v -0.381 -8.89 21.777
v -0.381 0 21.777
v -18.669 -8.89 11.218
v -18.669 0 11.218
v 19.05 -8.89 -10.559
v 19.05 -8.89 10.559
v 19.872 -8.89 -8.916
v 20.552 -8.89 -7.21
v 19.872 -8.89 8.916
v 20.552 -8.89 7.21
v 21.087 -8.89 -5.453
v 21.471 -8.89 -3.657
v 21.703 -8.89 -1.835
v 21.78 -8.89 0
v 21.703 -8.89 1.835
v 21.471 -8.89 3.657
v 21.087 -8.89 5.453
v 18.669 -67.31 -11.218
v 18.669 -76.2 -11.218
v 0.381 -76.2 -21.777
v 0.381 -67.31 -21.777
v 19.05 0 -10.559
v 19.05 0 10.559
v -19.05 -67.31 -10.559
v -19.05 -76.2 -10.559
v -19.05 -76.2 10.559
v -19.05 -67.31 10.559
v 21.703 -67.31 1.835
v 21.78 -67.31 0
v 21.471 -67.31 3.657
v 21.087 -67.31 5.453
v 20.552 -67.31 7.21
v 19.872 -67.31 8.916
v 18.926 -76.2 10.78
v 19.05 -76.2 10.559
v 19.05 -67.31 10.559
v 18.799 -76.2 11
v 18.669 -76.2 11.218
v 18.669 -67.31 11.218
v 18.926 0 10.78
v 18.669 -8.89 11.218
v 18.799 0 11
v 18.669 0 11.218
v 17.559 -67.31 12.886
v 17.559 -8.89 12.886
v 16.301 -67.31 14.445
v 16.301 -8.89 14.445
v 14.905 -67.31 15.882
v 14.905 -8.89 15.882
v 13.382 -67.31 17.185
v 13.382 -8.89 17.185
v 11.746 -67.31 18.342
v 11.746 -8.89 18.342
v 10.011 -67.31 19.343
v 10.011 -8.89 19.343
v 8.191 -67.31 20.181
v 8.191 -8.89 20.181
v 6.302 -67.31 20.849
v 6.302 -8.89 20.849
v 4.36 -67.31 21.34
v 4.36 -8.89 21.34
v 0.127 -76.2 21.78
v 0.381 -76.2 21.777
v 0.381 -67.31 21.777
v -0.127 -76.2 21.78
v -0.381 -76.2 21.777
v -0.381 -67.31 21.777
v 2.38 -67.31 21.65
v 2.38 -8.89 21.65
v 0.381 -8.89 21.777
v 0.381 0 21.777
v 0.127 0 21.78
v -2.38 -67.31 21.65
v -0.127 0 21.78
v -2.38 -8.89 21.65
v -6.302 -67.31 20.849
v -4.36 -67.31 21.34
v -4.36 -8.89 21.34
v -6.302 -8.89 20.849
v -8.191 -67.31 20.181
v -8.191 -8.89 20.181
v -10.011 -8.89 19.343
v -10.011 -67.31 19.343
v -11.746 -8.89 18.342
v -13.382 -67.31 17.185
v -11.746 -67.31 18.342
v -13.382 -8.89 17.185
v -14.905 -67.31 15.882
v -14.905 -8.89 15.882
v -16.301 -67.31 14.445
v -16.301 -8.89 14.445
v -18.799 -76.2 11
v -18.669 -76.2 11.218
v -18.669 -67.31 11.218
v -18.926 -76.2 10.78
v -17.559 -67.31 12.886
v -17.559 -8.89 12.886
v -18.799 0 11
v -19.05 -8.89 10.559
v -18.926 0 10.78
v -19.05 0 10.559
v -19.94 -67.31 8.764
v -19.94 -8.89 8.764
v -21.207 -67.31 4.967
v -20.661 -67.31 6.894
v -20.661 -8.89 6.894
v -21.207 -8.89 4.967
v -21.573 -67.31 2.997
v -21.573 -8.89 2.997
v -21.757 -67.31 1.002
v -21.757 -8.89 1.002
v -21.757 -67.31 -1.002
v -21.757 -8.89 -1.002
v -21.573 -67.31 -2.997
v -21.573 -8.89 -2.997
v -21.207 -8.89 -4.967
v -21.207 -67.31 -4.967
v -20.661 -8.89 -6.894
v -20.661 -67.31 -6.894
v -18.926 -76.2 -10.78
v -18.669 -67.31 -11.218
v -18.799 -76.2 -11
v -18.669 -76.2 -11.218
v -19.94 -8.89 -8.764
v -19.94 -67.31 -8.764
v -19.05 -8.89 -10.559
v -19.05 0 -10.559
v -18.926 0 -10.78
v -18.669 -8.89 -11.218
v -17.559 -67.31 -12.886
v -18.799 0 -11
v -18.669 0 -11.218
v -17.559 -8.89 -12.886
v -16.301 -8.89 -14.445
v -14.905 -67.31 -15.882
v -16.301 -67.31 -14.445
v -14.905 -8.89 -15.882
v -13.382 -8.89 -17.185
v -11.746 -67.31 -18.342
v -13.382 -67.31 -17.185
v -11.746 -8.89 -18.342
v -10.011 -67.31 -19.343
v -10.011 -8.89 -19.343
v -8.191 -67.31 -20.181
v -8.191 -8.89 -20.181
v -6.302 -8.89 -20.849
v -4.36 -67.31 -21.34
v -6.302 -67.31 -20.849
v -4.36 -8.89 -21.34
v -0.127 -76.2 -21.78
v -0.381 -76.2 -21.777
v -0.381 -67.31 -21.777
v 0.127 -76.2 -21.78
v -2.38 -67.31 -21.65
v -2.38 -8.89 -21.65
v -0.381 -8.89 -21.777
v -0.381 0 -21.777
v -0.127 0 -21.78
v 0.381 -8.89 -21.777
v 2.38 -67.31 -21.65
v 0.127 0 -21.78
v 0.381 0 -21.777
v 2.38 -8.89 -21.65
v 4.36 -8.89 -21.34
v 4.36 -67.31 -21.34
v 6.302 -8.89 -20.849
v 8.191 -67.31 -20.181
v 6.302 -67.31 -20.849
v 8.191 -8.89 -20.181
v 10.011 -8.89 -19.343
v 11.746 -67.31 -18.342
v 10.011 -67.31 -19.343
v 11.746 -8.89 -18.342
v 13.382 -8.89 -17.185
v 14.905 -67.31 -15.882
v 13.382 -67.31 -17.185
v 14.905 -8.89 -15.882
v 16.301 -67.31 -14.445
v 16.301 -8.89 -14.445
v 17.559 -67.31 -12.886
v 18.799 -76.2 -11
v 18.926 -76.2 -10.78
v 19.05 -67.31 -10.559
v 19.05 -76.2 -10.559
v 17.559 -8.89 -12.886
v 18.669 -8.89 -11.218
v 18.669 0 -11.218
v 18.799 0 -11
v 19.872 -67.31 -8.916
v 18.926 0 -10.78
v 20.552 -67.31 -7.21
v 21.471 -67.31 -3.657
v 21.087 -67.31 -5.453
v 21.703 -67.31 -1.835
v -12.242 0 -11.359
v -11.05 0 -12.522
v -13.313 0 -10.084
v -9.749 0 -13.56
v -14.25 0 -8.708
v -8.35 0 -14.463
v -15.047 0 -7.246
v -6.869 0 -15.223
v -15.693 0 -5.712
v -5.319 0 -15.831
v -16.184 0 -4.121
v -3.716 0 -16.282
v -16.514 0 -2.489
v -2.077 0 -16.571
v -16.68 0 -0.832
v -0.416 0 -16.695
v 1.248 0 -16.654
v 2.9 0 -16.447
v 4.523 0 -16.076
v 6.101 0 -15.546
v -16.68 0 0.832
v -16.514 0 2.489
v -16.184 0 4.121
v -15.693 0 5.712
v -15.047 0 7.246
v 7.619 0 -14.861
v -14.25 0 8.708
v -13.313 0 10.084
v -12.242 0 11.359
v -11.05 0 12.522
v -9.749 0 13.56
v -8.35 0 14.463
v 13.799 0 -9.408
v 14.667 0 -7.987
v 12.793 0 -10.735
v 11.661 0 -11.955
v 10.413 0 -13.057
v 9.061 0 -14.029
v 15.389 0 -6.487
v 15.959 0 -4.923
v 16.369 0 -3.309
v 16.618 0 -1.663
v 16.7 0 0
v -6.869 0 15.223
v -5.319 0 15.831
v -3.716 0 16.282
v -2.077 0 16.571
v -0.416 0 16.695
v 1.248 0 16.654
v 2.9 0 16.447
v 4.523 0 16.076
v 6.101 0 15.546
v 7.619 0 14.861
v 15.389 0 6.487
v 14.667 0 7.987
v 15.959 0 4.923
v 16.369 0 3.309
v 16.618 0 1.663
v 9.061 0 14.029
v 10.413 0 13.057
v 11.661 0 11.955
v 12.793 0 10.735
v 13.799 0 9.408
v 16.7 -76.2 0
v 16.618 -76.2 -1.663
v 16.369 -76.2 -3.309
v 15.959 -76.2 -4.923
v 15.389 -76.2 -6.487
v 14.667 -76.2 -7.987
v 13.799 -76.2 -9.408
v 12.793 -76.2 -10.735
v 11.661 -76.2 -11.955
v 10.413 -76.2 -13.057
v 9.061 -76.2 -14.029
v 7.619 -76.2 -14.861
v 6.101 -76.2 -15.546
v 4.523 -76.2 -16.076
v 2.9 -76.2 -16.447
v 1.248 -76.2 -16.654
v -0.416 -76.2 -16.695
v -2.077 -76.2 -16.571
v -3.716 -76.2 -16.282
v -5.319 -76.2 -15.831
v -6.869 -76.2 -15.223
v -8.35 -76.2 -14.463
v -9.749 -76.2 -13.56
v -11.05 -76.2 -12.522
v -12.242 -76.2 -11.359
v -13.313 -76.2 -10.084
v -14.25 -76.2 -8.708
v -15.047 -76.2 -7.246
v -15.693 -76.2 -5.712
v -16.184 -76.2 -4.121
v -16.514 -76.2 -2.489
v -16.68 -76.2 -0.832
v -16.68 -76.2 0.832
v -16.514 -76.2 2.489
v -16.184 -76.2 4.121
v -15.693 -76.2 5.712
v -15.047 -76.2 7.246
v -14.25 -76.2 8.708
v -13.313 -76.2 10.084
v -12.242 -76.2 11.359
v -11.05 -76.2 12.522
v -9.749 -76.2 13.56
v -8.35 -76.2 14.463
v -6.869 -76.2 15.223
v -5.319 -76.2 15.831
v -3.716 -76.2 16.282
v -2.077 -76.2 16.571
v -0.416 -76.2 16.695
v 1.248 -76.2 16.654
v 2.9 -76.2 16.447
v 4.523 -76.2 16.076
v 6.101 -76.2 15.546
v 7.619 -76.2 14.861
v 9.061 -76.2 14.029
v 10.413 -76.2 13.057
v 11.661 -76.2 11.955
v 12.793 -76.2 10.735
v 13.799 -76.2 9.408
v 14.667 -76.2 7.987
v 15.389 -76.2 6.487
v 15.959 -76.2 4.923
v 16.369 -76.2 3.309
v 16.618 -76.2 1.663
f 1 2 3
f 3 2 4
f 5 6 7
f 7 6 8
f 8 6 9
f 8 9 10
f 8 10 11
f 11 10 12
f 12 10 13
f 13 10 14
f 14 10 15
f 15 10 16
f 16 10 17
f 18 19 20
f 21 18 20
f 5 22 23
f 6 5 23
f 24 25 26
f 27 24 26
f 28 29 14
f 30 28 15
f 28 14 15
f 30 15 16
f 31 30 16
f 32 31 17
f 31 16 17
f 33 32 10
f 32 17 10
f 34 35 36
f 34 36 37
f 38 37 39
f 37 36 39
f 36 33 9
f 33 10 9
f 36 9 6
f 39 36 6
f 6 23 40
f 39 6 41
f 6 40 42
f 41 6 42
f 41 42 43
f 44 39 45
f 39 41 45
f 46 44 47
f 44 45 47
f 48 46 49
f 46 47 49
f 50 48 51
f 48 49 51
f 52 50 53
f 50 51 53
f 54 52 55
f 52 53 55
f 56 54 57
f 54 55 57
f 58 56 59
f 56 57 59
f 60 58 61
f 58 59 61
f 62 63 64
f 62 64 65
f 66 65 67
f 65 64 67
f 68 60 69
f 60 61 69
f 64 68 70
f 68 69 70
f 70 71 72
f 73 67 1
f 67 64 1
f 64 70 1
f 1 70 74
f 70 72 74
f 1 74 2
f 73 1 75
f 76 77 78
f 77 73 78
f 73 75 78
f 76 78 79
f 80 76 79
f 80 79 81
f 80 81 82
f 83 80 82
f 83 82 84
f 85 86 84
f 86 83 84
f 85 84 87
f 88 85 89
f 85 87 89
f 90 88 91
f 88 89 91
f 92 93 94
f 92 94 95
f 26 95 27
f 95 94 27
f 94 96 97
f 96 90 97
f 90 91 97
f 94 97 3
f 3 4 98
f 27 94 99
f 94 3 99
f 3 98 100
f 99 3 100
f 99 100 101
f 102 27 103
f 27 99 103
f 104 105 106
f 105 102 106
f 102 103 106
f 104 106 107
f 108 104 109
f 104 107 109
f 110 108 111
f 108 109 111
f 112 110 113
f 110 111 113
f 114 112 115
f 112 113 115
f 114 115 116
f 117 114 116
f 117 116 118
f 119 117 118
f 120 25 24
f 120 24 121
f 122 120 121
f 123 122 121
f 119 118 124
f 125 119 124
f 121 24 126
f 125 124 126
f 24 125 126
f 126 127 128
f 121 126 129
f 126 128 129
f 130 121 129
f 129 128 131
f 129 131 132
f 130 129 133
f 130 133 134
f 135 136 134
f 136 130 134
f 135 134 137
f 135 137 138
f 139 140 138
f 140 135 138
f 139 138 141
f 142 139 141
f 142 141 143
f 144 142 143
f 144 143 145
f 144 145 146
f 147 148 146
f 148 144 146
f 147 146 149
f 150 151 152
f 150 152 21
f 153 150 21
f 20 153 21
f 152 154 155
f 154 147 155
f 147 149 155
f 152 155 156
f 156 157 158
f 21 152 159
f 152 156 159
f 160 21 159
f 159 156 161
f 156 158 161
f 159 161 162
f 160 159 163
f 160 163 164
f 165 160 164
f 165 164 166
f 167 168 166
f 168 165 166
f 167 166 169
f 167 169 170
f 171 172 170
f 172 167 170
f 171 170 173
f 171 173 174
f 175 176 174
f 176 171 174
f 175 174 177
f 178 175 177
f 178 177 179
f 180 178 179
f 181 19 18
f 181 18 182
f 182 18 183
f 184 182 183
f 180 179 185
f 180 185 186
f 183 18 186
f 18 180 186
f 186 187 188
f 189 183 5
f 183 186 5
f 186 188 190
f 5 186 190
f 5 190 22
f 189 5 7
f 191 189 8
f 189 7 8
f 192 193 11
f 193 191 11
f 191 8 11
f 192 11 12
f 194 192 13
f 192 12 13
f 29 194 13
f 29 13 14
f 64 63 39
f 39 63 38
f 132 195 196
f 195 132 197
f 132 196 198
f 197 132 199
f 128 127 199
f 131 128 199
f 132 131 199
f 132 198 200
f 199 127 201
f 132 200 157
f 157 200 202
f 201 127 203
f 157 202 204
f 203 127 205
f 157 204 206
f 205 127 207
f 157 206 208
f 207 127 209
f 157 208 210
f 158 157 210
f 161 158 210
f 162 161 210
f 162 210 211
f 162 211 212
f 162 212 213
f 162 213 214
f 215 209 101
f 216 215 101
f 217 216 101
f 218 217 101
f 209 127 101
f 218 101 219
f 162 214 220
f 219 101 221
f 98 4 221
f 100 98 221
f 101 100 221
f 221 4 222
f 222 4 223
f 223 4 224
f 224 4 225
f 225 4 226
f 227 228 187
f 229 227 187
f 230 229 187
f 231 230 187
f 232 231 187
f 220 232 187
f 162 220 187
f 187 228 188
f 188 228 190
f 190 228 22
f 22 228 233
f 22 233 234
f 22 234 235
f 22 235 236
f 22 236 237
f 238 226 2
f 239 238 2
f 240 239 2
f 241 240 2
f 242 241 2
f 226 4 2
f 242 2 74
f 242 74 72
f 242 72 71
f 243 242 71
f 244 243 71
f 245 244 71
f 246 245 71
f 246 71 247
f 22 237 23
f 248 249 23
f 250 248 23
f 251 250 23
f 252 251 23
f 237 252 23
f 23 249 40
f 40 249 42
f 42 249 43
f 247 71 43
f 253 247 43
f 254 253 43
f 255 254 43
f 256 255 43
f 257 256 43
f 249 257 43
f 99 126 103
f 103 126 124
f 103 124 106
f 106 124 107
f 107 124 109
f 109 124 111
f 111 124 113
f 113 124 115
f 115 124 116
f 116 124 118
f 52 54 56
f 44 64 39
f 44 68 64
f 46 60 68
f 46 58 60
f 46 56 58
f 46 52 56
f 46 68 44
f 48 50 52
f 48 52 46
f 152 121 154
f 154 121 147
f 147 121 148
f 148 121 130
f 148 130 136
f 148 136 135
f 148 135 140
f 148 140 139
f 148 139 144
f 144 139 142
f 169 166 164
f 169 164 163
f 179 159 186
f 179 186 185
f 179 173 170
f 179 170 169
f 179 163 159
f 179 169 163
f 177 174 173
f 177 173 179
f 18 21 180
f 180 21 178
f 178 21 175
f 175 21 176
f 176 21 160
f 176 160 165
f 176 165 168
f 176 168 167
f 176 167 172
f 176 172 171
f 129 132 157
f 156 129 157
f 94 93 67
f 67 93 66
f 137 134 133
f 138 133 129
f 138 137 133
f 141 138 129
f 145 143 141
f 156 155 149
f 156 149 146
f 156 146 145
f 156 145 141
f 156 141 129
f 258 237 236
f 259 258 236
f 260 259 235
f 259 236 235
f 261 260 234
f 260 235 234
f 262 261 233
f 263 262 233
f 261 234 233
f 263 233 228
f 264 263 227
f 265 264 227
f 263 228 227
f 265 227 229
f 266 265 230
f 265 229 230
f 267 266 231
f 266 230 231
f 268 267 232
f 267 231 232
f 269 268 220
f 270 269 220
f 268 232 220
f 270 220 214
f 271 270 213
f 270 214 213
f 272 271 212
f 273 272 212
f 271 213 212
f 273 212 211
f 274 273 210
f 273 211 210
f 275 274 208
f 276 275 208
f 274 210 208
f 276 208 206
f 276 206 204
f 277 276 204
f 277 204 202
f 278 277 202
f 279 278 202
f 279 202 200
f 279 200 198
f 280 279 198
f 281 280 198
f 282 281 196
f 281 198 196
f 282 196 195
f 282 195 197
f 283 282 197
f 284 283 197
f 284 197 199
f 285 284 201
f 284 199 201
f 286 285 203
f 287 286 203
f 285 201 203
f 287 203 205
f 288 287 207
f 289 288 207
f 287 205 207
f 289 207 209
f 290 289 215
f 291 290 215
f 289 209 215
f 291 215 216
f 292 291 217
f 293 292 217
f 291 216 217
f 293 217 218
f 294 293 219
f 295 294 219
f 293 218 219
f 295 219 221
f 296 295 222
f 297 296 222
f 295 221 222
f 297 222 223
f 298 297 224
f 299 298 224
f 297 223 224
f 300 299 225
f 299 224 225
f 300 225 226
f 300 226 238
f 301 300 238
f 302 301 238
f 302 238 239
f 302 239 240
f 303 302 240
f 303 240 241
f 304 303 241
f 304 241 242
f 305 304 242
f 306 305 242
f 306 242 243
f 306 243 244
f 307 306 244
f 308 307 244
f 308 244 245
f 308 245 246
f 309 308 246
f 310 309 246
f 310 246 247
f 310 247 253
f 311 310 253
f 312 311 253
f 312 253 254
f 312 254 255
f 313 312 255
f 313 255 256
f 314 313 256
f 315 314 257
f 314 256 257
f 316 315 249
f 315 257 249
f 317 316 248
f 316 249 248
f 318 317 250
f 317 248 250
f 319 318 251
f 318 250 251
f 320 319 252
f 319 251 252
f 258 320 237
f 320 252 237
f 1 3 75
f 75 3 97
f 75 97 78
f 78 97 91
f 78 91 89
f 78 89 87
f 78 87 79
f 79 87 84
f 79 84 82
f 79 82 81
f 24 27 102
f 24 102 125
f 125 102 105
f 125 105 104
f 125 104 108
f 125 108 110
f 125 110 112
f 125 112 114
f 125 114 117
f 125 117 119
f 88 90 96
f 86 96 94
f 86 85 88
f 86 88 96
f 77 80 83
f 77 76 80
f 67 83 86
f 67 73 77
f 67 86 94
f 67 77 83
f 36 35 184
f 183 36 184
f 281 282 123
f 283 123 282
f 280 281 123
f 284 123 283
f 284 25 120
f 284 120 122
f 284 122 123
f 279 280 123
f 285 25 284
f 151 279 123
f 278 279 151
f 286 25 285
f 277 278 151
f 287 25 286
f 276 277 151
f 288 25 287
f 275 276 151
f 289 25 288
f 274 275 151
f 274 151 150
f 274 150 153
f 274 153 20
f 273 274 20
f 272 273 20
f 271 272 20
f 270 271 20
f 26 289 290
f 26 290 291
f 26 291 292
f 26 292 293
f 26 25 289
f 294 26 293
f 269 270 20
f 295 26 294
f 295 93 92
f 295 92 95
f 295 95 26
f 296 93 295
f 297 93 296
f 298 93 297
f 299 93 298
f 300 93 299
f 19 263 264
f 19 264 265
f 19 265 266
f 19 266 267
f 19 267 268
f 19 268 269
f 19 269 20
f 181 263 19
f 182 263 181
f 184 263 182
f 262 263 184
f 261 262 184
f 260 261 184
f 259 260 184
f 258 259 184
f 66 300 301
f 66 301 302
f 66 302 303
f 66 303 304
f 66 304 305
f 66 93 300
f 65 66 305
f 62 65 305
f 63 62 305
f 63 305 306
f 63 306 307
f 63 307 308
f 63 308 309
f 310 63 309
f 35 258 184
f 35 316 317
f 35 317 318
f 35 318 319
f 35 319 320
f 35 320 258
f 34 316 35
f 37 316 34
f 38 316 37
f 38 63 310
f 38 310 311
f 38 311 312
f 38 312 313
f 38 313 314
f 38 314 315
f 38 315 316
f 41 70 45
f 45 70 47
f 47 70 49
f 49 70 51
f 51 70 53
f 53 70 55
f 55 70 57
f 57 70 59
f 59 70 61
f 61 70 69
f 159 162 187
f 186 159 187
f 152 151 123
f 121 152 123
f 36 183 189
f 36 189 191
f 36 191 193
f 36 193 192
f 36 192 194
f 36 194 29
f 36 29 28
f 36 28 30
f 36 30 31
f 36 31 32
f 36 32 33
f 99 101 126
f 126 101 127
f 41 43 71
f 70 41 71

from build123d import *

# Parameters (mm, degrees)
CYLINDER_R          = 21.7805
CYLINDER_DEPTH      = 76.2
CYLINDER_ROLL_ANGLE = 90
SKETCH_R            = 16.7005
POCKET_DEPTH        = 76.2
SKETCH001_R         = 22.225
POCKET001_DEPTH     = 8.89
SKETCH002_R         = 22.225
POCKET002_DEPTH     = 8.89


with BuildPart() as part:
    # Cylinder → Cylinder (new body)
    with BuildSketch(Plane.XY):
        Circle(CYLINDER_R)
    extrude(amount=CYLINDER_DEPTH)


with BuildPart() as part_1:
    # Cylinder roll: moved
    add(part.part.rotate(Axis((0, 0, 0), (1, 0, 0)), CYLINDER_ROLL_ANGLE))


with BuildPart() as part_2:
    # Cylinder placement: moved
    add(part_1.part)

    # Sketch → Pocket (cut)
    with BuildSketch(Plane(origin=(0, 0, 0), x_dir=(1, 0, 0), z_dir=(0, 1, 0))):
        Circle(SKETCH_R)
    extrude(amount=-POCKET_DEPTH, mode=Mode.SUBTRACT)

    # Sketch001 → Pocket001 (cut)
    with BuildSketch(Plane(origin=(0, 0, 0), x_dir=(1, 0, 0), z_dir=(0, 1, 0))):
        Circle(SKETCH001_R)
        Polygon((-19.05, -10.998523), (-19.05, 10.998523), (0, 21.997045), (19.05, 10.998523), (19.05, -10.998523), (0, -21.997045), align=None, mode=Mode.SUBTRACT)
    extrude(amount=-POCKET001_DEPTH, mode=Mode.SUBTRACT)

    # Sketch002 → Pocket002 (cut)
    with BuildSketch(Plane.XZ.offset(76.2)):
        Circle(SKETCH002_R)
        Polygon((-19.05, -10.998523), (-19.05, 10.998523), (0, 21.997045), (19.05, 10.998523), (19.05, -10.998523), (0, -21.997045), align=None, mode=Mode.SUBTRACT)
    extrude(amount=-POCKET002_DEPTH, mode=Mode.SUBTRACT)


solid = part_2.part
